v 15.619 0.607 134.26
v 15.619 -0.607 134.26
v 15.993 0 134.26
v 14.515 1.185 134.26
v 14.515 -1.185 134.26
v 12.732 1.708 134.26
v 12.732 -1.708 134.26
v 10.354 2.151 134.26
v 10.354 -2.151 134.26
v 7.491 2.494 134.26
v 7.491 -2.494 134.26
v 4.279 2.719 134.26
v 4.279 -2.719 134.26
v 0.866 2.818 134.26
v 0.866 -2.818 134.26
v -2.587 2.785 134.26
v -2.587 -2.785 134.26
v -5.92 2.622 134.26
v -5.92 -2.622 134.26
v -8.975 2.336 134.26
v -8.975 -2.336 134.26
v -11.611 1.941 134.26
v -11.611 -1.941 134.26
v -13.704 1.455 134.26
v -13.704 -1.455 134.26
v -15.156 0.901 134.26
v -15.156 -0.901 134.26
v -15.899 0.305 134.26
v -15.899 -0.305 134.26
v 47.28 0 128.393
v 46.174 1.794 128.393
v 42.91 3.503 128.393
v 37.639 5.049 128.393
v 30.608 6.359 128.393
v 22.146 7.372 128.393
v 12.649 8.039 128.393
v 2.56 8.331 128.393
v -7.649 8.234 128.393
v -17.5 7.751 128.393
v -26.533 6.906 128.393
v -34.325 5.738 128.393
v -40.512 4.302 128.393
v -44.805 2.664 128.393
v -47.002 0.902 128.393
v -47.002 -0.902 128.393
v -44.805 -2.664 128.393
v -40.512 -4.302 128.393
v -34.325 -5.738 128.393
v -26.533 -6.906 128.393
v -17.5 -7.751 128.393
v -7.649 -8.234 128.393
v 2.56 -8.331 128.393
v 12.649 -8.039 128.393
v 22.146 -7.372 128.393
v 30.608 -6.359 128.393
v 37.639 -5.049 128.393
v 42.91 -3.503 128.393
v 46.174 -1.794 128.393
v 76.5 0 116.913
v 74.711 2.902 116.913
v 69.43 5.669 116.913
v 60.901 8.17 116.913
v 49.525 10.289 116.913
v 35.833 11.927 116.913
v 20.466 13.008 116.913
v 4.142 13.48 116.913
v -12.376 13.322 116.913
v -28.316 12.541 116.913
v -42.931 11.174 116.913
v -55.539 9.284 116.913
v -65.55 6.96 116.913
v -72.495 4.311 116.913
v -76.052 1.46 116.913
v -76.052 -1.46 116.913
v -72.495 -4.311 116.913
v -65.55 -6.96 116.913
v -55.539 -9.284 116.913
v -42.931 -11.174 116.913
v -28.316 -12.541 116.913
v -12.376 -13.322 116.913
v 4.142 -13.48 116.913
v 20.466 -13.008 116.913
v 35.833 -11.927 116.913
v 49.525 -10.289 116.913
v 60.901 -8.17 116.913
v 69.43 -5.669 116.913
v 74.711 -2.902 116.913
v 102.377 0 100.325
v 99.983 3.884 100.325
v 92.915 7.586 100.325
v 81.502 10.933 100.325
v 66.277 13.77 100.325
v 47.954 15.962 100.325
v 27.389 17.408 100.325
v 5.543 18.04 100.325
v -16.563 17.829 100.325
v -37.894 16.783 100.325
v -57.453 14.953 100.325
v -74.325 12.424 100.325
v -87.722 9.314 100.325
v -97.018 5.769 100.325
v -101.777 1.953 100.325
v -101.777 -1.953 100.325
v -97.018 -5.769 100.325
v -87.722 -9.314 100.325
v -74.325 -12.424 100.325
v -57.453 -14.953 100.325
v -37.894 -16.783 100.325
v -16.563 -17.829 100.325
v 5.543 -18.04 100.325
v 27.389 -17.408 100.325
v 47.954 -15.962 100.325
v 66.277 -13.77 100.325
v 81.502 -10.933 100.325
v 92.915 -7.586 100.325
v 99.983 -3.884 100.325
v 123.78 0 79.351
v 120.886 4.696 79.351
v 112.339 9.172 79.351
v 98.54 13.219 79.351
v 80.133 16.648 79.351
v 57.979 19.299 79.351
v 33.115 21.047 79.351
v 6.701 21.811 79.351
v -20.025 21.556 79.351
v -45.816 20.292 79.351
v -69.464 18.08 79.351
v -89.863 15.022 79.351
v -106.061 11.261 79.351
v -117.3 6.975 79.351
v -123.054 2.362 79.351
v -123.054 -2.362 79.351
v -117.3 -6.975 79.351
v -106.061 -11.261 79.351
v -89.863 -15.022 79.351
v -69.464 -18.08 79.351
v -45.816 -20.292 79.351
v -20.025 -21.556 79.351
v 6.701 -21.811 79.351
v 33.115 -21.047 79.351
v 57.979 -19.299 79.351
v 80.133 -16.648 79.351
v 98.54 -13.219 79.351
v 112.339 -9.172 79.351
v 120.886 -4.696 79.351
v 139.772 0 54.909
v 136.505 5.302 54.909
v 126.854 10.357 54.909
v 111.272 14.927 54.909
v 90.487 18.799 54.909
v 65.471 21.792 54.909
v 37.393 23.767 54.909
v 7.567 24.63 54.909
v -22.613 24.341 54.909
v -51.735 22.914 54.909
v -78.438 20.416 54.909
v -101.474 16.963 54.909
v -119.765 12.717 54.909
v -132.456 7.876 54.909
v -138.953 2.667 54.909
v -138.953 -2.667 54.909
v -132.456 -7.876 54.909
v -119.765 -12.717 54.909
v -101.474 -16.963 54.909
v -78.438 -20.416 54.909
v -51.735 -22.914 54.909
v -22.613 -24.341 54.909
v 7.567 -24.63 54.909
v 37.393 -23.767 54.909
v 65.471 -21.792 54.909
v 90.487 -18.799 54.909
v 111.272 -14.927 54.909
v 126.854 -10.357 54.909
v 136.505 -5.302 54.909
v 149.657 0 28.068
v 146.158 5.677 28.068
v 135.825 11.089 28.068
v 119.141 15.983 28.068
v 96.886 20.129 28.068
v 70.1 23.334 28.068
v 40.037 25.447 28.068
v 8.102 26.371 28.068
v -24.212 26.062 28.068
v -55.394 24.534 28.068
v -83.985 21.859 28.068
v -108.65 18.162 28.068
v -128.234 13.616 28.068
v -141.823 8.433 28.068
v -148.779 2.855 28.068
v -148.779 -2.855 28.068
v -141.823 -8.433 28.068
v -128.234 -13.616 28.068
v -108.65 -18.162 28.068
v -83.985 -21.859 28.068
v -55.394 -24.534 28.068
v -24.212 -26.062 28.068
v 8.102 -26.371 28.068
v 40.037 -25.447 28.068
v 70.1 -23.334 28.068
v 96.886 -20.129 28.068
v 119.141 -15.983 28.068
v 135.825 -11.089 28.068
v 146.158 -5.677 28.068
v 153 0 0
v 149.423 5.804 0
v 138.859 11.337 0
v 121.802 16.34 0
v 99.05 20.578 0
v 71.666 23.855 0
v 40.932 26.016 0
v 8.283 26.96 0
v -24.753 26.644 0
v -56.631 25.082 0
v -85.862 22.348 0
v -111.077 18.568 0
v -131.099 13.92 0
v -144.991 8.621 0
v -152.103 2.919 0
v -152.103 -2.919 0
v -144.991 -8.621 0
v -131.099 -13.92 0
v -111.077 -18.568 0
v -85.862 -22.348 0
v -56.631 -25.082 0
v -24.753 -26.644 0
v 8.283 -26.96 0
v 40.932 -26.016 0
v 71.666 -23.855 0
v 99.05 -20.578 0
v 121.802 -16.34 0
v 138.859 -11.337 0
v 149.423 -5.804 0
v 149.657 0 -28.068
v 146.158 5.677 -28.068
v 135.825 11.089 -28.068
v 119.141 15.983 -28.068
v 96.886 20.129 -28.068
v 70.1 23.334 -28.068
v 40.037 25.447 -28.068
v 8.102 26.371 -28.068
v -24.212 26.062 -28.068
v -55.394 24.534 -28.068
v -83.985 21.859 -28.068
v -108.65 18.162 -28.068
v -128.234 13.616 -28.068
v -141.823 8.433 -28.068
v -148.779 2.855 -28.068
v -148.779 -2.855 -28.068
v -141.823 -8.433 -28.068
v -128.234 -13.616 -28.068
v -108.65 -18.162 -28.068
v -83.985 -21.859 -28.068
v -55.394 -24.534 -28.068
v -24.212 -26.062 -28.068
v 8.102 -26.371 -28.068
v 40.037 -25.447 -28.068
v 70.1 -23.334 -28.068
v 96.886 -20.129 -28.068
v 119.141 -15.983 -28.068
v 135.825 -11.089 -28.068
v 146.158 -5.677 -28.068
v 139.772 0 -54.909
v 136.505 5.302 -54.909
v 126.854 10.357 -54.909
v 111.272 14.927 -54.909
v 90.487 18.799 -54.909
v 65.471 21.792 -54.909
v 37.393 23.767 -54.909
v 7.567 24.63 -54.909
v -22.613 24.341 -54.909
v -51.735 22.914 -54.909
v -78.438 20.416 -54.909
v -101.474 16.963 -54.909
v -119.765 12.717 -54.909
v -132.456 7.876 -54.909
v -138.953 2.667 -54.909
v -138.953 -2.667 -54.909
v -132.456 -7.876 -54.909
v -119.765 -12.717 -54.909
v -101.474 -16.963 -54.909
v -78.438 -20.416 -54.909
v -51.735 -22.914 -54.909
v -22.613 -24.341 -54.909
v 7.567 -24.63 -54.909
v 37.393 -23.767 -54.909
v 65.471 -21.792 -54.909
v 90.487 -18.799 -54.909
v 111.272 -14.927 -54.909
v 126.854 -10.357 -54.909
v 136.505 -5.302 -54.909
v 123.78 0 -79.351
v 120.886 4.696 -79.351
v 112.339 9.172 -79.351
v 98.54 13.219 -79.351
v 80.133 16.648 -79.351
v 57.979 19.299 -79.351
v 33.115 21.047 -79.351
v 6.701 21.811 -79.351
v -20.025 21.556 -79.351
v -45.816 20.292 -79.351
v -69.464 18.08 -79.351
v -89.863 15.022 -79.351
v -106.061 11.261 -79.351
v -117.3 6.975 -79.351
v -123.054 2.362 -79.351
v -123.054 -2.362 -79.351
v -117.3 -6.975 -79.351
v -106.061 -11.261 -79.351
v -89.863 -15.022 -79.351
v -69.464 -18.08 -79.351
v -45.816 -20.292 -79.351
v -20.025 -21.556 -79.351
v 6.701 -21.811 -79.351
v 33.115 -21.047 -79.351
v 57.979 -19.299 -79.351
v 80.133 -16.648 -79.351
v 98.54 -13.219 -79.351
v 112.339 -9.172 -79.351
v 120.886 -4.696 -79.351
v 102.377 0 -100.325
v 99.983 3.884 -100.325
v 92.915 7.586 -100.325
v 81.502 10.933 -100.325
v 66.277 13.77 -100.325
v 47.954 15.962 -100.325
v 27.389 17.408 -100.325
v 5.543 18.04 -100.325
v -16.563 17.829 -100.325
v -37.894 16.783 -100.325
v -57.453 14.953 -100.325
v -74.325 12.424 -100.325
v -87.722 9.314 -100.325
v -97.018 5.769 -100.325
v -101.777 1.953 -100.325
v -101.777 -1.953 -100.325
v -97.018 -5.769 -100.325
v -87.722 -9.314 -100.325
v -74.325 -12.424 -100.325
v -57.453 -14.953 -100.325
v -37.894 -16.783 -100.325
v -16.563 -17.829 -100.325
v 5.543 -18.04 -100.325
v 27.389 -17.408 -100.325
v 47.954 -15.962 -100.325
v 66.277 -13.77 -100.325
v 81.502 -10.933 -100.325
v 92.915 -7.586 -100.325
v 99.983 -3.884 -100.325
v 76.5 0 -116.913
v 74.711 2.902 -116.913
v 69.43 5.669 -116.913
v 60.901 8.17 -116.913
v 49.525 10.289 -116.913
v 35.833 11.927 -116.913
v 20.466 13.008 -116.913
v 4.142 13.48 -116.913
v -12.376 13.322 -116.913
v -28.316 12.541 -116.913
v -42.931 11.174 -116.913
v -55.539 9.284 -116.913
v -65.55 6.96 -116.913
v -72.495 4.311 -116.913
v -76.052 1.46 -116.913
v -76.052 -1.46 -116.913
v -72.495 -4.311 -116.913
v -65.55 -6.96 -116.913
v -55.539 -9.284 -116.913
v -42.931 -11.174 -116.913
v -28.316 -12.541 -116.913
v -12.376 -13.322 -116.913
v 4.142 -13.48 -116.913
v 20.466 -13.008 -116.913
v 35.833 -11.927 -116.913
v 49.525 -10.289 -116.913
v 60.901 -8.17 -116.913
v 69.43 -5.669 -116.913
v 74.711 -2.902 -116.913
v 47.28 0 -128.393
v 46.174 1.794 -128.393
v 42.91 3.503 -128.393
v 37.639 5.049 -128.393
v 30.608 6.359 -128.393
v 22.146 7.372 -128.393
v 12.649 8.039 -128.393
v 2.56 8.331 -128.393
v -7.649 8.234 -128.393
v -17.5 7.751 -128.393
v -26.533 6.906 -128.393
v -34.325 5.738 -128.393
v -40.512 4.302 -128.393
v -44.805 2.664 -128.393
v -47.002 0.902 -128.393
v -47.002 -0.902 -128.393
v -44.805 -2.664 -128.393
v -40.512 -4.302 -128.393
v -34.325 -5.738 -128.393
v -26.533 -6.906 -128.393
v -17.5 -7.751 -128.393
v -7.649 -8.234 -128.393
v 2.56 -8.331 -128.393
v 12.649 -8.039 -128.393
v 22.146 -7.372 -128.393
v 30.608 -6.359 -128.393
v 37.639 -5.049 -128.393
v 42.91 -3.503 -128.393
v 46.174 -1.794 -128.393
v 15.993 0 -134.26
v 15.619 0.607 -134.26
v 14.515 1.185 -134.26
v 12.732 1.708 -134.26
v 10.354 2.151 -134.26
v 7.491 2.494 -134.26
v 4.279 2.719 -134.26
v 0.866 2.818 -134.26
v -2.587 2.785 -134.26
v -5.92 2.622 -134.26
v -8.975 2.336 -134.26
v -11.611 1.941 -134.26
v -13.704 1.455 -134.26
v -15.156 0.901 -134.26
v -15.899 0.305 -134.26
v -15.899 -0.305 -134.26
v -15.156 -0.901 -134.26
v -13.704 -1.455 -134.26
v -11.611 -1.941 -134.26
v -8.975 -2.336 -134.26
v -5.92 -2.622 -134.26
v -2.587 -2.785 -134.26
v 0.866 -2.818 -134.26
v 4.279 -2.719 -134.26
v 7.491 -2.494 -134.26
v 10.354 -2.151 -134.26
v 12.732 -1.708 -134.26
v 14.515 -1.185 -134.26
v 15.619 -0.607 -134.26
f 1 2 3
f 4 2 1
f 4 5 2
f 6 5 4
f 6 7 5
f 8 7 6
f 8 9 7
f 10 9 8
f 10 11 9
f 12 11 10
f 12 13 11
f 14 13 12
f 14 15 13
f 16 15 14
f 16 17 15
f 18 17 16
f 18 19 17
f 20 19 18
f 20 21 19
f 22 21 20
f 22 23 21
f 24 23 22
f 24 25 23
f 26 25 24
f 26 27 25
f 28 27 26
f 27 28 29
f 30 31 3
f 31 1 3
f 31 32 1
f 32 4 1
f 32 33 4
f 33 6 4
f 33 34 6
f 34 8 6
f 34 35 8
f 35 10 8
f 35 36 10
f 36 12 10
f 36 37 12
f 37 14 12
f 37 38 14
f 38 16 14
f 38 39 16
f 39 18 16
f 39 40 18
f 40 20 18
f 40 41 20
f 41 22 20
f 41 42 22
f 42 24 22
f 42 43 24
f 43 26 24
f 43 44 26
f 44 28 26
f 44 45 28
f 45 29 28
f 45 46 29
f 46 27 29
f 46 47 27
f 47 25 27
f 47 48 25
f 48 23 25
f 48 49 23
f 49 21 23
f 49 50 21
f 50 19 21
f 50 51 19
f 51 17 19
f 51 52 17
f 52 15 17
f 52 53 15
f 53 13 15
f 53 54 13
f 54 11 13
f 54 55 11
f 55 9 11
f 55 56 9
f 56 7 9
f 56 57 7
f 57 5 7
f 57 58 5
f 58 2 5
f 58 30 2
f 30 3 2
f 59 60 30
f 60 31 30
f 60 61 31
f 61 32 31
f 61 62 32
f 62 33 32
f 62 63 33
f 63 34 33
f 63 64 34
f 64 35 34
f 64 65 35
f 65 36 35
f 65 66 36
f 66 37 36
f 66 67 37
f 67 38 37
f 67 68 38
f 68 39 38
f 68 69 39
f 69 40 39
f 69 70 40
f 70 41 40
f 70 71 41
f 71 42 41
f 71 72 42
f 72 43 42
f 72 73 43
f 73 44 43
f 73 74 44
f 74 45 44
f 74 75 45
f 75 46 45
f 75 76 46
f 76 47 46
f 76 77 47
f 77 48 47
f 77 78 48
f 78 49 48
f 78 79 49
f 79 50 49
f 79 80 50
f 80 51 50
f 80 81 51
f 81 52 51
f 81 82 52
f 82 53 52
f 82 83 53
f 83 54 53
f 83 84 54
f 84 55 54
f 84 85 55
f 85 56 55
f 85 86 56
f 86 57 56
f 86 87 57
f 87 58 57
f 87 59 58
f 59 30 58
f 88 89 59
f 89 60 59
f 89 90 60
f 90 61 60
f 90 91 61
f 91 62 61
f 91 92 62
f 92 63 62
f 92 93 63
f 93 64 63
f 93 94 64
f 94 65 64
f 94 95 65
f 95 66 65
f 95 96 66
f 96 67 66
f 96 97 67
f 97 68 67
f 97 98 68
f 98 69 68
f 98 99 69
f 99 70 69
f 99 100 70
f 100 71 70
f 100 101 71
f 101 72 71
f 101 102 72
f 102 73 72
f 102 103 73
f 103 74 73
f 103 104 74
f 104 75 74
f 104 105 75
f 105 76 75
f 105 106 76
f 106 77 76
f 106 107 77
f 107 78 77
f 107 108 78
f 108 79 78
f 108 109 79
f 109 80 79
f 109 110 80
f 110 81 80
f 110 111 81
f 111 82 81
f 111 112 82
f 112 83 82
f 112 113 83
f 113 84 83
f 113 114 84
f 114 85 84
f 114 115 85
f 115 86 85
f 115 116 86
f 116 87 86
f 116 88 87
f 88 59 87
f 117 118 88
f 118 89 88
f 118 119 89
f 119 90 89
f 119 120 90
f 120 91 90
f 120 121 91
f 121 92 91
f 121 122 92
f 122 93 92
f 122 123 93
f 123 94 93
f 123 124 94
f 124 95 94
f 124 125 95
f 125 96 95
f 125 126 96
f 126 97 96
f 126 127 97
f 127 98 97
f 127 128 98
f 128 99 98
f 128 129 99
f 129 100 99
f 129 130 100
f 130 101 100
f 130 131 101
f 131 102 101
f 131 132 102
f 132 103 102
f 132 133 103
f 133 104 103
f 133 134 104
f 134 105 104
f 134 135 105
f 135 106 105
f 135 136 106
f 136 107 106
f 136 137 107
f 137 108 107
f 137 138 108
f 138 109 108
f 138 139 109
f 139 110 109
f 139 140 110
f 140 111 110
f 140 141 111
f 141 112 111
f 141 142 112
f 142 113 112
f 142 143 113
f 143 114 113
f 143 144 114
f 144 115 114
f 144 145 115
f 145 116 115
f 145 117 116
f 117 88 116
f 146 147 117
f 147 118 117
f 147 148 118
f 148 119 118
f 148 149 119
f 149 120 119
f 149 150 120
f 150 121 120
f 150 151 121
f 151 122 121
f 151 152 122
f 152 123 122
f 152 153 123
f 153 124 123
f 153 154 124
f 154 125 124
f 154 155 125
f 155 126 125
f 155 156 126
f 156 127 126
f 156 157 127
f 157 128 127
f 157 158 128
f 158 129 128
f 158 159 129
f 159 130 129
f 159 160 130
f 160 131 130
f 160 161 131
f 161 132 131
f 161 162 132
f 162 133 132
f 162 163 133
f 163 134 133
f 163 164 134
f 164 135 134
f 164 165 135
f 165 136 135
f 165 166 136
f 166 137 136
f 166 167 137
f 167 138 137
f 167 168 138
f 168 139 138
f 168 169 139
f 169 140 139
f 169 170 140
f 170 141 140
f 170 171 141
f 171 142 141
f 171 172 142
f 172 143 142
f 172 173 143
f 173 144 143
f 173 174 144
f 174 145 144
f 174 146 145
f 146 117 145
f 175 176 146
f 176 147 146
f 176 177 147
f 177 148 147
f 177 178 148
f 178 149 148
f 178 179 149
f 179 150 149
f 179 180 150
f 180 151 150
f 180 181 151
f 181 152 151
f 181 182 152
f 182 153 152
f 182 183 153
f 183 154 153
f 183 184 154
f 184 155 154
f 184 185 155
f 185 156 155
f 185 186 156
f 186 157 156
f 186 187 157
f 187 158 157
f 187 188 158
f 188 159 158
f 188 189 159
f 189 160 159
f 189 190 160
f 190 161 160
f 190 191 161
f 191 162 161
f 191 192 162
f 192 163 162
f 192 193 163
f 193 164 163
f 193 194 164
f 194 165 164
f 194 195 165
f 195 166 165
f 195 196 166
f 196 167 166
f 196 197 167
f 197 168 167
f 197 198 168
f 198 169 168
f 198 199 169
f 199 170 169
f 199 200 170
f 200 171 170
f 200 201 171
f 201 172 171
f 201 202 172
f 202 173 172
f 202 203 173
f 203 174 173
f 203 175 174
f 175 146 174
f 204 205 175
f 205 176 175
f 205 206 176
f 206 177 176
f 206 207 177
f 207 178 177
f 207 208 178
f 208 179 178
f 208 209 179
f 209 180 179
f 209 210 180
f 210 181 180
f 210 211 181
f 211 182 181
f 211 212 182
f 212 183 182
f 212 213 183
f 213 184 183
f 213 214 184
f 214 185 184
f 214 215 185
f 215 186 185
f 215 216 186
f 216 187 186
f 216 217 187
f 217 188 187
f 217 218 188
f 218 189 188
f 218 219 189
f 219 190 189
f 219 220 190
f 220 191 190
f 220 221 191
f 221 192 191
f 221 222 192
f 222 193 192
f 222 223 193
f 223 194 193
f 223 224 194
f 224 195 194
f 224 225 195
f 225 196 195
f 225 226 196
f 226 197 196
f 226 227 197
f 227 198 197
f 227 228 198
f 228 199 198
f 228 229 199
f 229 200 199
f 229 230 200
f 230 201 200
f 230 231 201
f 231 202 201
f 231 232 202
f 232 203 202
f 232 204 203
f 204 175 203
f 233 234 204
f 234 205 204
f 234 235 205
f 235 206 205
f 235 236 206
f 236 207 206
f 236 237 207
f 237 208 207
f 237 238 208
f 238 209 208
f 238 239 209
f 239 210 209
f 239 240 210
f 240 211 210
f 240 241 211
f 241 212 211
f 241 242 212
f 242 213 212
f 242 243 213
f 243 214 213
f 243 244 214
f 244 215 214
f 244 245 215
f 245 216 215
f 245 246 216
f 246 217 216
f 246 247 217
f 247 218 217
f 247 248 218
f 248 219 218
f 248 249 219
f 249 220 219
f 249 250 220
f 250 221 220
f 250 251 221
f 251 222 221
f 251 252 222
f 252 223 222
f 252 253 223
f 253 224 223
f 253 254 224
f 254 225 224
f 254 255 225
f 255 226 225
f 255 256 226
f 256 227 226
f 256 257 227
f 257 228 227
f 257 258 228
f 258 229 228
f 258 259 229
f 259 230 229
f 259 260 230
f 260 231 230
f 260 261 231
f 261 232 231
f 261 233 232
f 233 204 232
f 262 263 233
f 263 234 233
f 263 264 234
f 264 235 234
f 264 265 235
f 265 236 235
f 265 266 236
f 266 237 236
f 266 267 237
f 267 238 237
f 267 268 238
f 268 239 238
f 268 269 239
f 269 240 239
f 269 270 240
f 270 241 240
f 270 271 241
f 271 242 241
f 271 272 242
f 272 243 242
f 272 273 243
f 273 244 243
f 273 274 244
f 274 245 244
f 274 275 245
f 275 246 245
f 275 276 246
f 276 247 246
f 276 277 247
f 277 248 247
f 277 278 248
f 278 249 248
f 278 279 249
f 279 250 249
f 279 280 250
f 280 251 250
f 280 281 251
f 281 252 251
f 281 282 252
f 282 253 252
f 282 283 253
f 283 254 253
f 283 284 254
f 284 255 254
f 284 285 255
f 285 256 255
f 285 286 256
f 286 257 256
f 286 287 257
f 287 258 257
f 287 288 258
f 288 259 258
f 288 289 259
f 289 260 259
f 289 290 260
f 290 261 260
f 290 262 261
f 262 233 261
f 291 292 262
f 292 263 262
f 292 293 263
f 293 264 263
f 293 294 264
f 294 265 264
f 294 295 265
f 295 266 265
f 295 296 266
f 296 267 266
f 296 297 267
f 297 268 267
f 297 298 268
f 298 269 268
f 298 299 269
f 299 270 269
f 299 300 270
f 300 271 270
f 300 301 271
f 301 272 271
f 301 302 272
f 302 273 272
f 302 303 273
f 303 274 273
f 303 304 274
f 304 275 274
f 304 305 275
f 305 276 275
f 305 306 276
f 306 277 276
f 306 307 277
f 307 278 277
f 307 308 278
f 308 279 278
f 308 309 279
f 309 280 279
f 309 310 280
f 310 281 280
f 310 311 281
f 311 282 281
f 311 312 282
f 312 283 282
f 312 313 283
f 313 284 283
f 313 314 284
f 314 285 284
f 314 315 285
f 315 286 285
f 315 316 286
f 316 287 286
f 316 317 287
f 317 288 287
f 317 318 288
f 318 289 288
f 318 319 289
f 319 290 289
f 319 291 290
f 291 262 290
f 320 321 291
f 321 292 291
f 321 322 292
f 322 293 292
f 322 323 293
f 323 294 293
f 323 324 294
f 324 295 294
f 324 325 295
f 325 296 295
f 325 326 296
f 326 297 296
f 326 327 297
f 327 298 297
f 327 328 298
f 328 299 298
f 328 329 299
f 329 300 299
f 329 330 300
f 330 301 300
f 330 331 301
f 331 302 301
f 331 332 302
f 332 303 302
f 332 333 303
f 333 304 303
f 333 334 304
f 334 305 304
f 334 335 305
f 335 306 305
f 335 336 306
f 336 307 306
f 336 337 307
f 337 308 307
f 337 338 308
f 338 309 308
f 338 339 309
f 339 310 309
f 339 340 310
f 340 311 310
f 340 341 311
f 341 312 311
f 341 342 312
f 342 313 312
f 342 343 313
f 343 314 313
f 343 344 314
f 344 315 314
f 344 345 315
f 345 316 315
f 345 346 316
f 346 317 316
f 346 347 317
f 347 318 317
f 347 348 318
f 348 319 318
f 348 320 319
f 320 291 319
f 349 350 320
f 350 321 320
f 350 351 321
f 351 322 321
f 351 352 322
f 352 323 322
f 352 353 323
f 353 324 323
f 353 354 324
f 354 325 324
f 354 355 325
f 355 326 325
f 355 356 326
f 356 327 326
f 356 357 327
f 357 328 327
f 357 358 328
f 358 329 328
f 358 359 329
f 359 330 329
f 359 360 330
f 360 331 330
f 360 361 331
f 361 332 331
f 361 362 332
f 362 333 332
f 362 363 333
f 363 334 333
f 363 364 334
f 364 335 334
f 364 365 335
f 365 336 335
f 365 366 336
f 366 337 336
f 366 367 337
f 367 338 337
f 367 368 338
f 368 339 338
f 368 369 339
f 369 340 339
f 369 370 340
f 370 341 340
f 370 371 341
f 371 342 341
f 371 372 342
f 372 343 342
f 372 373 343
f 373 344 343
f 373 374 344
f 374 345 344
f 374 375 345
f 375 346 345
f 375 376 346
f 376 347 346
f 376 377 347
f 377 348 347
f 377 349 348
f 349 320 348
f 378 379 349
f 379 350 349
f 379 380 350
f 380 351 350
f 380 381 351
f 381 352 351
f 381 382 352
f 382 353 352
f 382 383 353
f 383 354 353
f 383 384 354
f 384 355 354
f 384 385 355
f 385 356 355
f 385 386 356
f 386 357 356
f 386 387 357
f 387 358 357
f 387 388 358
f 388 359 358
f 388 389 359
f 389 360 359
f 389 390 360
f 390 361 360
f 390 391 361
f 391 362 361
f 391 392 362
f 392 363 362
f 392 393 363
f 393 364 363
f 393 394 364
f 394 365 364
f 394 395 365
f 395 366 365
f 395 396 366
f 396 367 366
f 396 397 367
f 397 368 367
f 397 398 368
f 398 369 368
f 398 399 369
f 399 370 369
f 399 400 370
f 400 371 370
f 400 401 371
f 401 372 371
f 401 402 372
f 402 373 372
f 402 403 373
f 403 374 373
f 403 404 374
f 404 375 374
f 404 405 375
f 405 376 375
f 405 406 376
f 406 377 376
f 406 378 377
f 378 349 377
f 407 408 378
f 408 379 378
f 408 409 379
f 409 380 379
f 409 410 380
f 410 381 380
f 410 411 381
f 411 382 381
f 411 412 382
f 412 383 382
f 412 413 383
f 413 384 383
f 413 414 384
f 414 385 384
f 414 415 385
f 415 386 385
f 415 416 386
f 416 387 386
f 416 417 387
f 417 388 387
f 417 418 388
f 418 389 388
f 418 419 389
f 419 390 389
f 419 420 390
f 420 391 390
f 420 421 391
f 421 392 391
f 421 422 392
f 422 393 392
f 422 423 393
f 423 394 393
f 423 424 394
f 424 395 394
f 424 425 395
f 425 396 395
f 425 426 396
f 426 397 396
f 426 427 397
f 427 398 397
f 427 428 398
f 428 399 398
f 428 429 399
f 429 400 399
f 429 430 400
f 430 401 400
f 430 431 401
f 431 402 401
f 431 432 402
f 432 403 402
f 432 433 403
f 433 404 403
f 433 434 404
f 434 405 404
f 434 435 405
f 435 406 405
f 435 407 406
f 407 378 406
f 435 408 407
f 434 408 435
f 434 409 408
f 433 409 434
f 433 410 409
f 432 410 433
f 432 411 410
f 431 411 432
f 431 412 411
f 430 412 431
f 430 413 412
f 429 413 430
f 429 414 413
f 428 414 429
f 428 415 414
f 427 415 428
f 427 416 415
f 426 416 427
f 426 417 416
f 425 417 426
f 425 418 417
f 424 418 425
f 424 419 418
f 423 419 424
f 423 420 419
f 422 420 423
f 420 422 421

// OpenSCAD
// Generated by SolidPython 1.0.1 on 2020-07-29 00:46:52


scale(v = [17, 3, 15]) {
	sphere(r = 9);
}
/***********************************************
*********      SolidPython code:      **********
************************************************
 
# import packages: SolidPython
from solid import *
from solid.utils import *
from itertools import chain, combinations, permutations


class Resize:

    def __init__(self, scad_file):
        self.scad_file = scad_file
        #self.scad_file = import_scad(scad_file)
        # cone/cylinder param:
        self.r1 = 0
        self.r2 = 0
        self.h = 0
        # rectangular prism param:
        self.w = 0
        self.l = 0
        # ellipse param:
        self.r = 0

    # import OpenScad code (file name corresponds to shape)


    # classify shape + parameters
    def assign(self, param1, param2, param3):
        if self.scad_file == 'cone.scad':
            self.r1 = param1
            self.r2 = param2
            self.h = param3
        elif self.scad_file == 'cylinder.scad':
            self.r1 = param1
            self.r2 = param2
            self.h = param3
        elif self.scad_file == 'rectangularPrism.scad':
            self.h = param1
            self.l = param2
            self.w = param3
        else:
            self.r = param1
            self.h = param2

    # resize parameters
    def iterate(self):
        x = range(3, 20, 2)
        i = 1
        if self.scad_file == 'cone.scad':
            tempList = list(permutations(x, 2))
            for temp in tempList:
                param1 = temp[0]
                param2 = temp[1]
                filepath = 'produced_scad_files/' + 'cone' + str(param1) + '_' + str(param2) + '_' + '.scad'
                scad_render_to_file(cylinder(h=param1, r1=param2, r2=0), filepath)

        elif self.scad_file == 'cylinder.scad':
            tempList = list(permutations(x, 3))
            for temp in tempList:
                param1 = temp[0]
                param2 = temp[1]
                filepath = 'produced_scad_files/' + 'cylinder' + str(param1) + '_' + str(param2) + '_' + '.scad'
                scad_render_to_file(cylinder(h=param1, r1=param2, r2=param2), filepath)

        elif self.scad_file == 'rectangularPrism.scad':
            tempList = list(permutations(x, 3))
            for temp in tempList:
                param1 = temp[0]
                param2 = temp[1]
                param3 = temp[2]
                filepath = 'produced_scad_files/' + 'rectangularPrism' + str(param1) + '_' + str(param2) + '_' + str(
                    param3) + '.scad'
                scad_render_to_file(cube(size=(param1, param2, param3)), filepath)

        elif self.scad_file == 'ellipse.scad':
            tempList = list(permutations(x, 4))
            for temp in tempList:
                param1 = temp[0]
                param2 = temp[1]
                param3 = temp[2]
                param4 = temp[3]
                filepath = 'produced_scad_files/' + 'ellipse' + str(param1) + '_' + str(param2) + '_' + str(param3) + '_' + str(param4) + '.scad'
                scad_render_to_file(scale([param1, param2, param3])(sphere(r=param4)), filepath)

    def render_to_scadfile(self):
        scad_render_to_file(scad, 'example.scad') 
 
************************************************/
